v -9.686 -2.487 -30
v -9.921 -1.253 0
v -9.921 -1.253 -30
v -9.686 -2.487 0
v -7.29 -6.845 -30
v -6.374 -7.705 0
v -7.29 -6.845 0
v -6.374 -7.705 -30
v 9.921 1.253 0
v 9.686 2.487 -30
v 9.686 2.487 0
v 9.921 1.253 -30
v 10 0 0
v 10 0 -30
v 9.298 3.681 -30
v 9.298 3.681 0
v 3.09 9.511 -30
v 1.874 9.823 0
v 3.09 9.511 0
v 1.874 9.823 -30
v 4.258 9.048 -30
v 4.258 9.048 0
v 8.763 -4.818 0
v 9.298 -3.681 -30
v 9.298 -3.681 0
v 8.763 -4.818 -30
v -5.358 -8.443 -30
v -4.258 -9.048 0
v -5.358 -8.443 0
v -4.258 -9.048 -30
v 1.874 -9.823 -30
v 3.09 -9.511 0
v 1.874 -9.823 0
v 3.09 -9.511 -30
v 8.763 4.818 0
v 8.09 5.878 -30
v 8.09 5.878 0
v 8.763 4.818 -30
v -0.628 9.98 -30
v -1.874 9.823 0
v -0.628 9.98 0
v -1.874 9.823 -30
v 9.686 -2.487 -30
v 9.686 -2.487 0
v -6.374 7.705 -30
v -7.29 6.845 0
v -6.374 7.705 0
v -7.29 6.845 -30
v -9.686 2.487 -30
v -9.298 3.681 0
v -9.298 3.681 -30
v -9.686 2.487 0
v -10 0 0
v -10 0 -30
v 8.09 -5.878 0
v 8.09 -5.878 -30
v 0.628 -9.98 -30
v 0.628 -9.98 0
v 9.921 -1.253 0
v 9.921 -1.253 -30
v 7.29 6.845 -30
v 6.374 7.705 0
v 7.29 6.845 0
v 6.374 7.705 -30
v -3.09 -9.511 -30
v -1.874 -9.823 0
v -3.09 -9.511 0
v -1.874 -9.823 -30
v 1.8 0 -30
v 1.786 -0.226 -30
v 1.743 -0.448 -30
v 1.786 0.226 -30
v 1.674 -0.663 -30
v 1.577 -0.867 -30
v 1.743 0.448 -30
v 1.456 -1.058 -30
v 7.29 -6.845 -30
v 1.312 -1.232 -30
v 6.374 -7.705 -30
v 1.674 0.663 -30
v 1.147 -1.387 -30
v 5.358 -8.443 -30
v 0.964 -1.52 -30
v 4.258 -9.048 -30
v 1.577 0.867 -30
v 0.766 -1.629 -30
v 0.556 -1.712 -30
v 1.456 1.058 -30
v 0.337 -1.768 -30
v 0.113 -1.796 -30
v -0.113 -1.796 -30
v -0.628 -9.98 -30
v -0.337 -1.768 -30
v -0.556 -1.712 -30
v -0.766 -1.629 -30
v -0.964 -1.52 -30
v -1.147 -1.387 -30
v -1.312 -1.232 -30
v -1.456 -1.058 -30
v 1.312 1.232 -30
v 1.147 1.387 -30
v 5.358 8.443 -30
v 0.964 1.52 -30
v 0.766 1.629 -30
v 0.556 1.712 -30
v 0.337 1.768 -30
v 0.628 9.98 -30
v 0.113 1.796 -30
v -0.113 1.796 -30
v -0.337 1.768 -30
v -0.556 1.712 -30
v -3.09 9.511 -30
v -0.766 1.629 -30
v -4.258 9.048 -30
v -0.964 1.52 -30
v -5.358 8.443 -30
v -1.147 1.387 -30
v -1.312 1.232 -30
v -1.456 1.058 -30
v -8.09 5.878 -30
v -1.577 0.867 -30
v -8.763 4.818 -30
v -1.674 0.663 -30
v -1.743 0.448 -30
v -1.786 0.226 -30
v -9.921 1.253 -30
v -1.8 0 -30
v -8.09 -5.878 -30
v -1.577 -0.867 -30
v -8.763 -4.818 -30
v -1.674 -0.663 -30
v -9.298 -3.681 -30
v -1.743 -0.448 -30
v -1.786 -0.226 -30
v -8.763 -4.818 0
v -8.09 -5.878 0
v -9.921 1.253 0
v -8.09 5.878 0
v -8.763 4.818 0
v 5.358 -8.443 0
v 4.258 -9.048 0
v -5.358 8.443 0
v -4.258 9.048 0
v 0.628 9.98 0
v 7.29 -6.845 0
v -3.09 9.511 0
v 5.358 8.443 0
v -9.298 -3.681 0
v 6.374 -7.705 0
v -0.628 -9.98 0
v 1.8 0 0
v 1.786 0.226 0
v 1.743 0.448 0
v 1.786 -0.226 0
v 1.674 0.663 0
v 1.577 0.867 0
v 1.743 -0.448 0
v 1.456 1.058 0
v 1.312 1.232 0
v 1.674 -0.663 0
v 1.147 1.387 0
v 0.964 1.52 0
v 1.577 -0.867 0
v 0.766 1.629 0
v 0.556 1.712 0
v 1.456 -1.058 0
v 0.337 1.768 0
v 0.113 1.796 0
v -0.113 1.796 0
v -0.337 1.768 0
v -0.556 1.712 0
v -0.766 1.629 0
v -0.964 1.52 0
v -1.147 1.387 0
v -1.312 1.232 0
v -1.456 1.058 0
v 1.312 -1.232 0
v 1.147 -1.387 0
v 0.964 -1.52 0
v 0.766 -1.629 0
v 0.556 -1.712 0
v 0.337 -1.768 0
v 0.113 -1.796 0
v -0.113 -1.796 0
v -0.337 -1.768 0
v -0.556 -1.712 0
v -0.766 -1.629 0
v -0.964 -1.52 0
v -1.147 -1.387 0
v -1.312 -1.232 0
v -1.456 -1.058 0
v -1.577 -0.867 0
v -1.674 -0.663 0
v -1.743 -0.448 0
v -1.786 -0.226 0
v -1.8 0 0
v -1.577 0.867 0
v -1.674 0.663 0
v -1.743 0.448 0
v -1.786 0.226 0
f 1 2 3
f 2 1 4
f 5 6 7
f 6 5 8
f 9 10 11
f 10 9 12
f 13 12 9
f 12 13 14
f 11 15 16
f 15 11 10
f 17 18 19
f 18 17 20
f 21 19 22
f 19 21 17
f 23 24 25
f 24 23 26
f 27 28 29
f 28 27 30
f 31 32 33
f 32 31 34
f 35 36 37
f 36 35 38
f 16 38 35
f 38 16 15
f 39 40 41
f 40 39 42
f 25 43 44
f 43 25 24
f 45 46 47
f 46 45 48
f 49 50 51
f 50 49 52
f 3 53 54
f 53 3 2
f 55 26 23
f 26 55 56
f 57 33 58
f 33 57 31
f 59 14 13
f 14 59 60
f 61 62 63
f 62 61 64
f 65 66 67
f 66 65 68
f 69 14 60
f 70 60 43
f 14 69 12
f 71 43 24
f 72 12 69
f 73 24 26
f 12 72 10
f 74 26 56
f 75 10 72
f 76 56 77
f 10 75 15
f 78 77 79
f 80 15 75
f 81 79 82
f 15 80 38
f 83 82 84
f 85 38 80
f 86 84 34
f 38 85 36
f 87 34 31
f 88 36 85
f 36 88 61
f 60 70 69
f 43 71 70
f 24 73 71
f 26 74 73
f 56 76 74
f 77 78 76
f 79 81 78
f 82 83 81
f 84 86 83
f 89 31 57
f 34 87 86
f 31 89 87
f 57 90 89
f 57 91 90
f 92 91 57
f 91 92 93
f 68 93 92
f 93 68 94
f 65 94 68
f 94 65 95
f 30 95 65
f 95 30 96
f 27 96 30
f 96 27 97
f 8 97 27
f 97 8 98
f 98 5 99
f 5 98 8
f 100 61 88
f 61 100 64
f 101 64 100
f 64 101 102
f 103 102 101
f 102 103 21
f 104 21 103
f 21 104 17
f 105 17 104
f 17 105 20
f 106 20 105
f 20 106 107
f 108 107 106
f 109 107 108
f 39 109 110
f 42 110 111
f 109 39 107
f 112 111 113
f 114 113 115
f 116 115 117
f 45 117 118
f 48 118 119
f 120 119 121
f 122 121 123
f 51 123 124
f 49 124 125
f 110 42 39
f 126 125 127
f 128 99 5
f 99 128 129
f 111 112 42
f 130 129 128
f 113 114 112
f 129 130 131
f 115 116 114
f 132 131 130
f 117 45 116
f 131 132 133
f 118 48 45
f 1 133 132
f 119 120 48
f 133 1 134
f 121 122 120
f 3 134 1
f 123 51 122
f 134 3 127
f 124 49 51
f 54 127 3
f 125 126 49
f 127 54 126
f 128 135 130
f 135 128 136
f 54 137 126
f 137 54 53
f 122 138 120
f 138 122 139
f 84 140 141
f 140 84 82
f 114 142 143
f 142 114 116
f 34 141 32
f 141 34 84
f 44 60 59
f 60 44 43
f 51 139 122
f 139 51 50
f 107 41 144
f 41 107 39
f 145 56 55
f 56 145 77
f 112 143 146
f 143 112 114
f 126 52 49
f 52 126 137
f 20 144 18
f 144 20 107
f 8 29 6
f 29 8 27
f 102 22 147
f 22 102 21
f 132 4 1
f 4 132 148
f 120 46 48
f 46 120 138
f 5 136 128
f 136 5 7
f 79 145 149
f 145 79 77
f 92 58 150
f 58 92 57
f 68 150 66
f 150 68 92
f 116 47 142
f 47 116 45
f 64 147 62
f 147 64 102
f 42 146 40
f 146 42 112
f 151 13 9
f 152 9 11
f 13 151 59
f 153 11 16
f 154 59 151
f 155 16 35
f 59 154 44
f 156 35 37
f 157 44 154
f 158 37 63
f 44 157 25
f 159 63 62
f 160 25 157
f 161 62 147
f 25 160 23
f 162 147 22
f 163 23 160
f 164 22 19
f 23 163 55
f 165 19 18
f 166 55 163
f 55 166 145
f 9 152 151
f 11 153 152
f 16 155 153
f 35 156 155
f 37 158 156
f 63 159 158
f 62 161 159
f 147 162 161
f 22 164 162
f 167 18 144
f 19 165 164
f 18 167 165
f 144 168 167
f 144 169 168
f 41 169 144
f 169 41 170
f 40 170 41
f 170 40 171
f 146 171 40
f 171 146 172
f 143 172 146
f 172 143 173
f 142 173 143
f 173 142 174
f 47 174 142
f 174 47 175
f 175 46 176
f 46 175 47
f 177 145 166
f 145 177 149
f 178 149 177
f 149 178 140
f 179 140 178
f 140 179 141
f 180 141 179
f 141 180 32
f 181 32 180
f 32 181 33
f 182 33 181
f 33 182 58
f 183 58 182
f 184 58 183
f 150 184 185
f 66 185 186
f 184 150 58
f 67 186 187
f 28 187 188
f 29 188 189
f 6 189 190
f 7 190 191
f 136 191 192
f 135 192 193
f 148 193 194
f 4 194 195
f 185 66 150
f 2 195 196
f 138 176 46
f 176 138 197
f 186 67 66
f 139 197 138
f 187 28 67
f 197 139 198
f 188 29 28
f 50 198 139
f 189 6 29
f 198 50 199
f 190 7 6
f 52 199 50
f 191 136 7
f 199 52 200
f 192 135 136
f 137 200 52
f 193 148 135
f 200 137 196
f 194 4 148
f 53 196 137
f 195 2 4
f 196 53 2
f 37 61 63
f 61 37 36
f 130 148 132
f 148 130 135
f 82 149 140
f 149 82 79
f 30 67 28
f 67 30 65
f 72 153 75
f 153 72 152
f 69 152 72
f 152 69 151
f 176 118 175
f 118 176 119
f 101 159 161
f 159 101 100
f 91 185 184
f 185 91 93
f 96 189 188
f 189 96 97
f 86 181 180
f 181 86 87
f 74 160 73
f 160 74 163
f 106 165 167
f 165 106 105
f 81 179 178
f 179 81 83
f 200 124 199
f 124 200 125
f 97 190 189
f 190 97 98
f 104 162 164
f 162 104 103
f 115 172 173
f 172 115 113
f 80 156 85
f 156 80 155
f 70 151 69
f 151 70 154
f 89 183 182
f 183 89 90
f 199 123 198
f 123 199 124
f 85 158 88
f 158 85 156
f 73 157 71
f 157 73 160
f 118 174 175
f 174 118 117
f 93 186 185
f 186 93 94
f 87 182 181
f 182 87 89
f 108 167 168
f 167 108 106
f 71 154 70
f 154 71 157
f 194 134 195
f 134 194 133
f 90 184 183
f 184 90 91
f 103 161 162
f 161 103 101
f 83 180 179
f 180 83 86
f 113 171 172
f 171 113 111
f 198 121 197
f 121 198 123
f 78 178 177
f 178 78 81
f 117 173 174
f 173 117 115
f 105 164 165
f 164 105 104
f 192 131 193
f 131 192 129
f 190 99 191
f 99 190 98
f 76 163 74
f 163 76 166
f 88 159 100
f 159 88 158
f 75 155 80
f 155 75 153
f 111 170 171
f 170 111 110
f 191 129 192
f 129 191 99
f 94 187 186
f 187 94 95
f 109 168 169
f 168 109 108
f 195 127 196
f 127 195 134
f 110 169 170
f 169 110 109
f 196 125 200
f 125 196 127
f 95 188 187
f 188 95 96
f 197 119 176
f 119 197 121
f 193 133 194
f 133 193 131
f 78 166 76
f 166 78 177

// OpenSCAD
$fn = 50;


difference() {
	union() {
		translate(v = [0, 0, -30.0000000000]) {
			cylinder(h = 30, r = 10.0000000000);
		}
	}
	union() {
		#translate(v = [0, 0, -30]) {
			cylinder(h = 30, r = 1.8000000000);
		}
	}
}
